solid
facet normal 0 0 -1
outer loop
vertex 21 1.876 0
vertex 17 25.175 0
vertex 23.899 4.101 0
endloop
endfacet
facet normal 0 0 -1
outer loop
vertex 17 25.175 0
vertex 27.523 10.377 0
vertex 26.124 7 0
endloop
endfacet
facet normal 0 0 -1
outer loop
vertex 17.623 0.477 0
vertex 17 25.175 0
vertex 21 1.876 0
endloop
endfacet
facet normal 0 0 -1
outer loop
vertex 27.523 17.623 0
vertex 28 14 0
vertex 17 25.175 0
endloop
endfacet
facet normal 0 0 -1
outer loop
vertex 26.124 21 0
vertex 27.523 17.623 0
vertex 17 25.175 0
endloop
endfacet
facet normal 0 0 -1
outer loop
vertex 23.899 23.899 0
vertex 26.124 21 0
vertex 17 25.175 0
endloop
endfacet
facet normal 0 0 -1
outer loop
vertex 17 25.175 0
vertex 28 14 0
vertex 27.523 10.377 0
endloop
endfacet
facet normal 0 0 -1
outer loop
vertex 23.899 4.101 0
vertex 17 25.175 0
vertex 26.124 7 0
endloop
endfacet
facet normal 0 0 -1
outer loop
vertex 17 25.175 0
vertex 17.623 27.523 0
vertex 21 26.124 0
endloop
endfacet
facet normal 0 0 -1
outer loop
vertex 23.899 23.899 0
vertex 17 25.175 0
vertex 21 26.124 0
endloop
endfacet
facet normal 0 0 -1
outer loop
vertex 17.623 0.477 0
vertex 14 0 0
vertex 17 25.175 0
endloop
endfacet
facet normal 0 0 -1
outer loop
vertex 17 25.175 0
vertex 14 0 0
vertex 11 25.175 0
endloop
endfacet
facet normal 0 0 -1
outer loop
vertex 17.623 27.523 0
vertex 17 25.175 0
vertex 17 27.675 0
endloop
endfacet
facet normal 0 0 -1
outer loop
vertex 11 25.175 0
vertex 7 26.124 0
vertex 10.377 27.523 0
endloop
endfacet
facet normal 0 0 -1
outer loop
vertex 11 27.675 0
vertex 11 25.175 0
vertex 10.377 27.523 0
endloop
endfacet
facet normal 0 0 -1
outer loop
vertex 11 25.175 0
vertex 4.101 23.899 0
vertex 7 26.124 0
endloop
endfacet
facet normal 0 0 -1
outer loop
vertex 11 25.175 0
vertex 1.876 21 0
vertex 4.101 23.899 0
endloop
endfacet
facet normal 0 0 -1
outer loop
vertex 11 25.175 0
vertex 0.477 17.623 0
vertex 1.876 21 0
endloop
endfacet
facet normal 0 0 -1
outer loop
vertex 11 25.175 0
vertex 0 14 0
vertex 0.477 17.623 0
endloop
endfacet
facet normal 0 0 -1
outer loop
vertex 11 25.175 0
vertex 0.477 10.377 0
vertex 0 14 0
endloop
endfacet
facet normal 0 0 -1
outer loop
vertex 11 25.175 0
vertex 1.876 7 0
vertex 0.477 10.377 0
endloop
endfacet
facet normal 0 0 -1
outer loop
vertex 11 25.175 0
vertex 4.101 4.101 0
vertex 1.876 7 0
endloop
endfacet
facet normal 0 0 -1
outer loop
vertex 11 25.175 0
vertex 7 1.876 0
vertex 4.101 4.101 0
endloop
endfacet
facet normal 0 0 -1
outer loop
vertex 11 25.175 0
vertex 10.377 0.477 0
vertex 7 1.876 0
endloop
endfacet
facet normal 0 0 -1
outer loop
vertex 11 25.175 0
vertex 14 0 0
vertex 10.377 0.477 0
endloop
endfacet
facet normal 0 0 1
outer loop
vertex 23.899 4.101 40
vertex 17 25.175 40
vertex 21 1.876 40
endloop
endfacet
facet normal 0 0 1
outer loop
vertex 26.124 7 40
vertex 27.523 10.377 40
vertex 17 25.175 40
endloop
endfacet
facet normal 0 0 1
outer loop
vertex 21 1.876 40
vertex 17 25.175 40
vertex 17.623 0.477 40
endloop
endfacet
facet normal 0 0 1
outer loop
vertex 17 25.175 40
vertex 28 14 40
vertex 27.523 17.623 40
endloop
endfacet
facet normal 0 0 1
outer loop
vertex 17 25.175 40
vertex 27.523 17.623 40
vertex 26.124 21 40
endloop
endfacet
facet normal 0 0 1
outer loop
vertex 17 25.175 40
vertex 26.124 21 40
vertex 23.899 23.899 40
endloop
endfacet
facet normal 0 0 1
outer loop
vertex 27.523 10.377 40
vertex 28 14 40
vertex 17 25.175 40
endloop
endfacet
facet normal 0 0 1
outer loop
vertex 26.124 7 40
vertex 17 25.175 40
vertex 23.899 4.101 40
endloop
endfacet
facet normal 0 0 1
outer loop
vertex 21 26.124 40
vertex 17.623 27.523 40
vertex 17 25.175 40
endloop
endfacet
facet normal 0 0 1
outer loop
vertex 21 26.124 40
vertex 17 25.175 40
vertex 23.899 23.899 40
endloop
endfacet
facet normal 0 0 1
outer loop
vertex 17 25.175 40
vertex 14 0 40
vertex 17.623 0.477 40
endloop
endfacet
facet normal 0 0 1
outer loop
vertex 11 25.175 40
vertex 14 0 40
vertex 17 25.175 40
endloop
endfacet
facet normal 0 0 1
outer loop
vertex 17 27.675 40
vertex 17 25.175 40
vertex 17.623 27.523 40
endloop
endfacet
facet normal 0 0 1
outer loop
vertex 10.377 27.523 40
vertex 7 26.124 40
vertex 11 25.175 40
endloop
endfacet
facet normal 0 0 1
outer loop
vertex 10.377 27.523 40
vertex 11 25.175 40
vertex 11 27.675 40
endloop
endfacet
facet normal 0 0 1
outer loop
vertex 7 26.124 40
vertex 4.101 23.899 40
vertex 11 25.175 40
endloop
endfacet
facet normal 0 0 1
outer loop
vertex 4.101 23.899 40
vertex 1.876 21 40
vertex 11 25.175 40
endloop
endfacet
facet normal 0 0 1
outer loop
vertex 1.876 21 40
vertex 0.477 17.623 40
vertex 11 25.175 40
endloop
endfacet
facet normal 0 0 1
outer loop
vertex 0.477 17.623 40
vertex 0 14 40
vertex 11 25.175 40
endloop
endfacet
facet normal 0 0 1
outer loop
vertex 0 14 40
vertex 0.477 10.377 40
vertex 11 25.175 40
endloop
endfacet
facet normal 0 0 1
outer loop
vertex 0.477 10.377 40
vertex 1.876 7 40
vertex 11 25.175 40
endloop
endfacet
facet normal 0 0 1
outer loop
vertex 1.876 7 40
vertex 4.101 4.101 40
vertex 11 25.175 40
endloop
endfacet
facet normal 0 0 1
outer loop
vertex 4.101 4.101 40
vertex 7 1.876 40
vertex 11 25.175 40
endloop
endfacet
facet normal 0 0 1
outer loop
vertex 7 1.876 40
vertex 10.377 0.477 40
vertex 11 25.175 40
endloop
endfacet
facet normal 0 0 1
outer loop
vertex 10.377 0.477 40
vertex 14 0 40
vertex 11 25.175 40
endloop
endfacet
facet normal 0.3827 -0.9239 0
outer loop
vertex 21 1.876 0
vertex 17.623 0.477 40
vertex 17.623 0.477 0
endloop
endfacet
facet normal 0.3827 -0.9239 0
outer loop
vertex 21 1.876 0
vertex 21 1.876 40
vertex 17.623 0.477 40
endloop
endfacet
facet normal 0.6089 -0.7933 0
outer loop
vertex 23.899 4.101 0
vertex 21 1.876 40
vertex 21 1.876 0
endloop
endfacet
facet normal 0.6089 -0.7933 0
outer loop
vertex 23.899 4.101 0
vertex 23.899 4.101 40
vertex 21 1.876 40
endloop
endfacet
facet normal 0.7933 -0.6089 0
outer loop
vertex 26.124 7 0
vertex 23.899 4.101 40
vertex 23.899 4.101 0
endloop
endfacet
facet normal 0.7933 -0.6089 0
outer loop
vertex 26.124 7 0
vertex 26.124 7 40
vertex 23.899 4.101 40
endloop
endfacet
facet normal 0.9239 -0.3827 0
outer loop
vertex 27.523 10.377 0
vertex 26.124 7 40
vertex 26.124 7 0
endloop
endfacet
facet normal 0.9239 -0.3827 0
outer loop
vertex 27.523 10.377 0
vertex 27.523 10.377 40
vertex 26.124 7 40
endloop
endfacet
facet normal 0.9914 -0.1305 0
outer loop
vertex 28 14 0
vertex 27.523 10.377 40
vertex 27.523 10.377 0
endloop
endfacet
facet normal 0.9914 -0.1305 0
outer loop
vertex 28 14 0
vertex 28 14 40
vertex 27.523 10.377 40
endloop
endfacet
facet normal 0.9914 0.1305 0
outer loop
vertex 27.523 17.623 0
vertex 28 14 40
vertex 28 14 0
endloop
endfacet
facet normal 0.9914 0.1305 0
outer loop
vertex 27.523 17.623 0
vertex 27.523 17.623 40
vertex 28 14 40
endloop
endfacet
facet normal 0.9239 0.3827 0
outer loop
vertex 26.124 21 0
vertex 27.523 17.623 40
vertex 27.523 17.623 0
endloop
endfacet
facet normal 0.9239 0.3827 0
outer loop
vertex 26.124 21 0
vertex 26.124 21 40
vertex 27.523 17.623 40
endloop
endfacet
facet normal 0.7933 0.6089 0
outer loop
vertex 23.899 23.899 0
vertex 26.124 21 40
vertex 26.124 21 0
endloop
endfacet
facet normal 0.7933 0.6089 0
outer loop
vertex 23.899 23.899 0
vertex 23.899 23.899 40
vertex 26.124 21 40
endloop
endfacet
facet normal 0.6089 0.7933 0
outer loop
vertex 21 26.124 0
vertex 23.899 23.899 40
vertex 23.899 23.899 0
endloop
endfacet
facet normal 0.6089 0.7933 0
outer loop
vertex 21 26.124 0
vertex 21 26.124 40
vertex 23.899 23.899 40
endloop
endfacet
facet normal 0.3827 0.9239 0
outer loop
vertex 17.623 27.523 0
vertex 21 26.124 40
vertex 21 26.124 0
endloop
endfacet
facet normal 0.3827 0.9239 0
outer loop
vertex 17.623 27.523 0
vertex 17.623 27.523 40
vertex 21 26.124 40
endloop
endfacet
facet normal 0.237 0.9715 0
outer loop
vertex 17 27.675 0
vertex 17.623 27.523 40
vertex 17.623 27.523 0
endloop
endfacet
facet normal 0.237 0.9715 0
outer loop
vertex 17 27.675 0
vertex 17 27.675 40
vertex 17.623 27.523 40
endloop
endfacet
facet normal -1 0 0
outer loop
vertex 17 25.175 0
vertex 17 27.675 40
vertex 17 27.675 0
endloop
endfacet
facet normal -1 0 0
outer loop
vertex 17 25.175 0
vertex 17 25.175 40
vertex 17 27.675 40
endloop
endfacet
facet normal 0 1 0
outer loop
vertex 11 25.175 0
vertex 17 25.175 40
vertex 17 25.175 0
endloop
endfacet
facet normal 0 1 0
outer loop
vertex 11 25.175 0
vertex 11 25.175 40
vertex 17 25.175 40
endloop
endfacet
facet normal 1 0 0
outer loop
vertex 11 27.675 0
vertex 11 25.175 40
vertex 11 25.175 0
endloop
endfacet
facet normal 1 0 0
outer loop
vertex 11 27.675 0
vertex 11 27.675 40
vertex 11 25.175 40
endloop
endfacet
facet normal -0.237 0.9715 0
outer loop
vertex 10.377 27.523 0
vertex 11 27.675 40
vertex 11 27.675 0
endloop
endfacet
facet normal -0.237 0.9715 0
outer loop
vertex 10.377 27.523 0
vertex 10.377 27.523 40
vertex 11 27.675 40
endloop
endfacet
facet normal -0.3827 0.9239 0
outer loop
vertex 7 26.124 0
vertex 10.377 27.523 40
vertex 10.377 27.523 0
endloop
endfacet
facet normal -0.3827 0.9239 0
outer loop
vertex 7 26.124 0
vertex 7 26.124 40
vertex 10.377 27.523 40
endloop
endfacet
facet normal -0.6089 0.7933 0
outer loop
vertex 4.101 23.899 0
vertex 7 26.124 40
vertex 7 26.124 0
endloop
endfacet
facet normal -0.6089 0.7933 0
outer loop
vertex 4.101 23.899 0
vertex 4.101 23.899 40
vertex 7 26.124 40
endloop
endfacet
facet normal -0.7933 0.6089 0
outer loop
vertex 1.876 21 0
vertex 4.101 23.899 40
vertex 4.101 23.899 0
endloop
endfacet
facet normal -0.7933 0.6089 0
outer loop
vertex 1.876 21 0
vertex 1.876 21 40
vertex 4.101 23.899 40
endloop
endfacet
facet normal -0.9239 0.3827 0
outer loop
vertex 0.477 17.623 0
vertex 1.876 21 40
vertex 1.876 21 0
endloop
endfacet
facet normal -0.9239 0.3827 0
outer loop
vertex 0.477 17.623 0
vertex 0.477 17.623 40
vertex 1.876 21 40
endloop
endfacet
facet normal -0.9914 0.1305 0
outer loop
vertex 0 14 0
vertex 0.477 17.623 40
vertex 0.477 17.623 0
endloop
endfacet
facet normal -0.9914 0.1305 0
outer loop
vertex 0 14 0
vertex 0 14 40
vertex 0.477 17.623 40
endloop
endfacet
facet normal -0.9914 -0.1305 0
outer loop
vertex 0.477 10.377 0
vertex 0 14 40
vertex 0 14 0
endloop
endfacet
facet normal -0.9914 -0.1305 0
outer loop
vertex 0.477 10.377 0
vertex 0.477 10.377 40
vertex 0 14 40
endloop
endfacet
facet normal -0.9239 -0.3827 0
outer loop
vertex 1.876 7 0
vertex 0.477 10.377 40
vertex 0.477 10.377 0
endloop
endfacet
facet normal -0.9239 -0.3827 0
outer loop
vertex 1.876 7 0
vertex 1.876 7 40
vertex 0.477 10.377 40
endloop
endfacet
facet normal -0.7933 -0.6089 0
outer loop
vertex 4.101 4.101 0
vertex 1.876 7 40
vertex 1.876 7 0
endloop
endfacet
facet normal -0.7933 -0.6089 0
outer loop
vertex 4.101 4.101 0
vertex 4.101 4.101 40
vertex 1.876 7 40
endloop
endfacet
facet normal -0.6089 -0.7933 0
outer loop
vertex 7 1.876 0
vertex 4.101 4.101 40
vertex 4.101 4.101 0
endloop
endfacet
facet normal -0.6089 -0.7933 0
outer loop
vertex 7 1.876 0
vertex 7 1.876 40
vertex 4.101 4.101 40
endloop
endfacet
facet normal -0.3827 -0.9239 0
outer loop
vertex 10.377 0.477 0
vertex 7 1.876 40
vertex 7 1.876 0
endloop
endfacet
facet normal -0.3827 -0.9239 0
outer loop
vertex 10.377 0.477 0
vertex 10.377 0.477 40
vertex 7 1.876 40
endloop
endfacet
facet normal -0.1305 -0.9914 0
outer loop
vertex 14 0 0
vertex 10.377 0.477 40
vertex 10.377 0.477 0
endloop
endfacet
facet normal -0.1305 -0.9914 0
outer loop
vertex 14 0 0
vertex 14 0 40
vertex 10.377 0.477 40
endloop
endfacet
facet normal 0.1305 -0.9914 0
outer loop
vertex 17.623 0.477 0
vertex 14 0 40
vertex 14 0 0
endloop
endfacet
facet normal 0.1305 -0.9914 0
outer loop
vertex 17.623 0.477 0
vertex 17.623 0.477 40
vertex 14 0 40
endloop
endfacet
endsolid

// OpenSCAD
$fn = 32;

// ----------------------------------------------------------------------
// Keyway shaft: d28 shaft, key 6 x 2.5 mm
// ----------------------------------------------------------------------

// --- parameters (mm) ---
shaft_r = 14;             // shaft radius
key_w = 6;                // keyway width
key_d = 2.5;              // keyway depth below the surface line
plate_t = 40;             // shaft length, Z (extrusion height)

shaft_d = 2 * shaft_r;  // shaft diameter
circle_step = 15;  // polygon sampling step, degrees

profile = [[10.377, 27.523], [7, 26.124], [4.101, 23.899], [1.876, 21], [0.477, 17.623], [0, 14], [0.477, 10.377], [1.876, 7], [4.101, 4.101], [7, 1.876], [10.377, 0.477], [14, 0], [17.623, 0.477], [21, 1.876], [23.899, 4.101], [26.124, 7], [27.523, 10.377], [28, 14], [27.523, 17.623], [26.124, 21], [23.899, 23.899], [21, 26.124], [17.623, 27.523], [17, 27.675], [17, 25.175], [11, 25.175], [11, 27.675]];  // primary outline, 27 points, counter clockwise

// --- the one profile operation ---
linear_extrude(height = plate_t) polygon(points = profile);
